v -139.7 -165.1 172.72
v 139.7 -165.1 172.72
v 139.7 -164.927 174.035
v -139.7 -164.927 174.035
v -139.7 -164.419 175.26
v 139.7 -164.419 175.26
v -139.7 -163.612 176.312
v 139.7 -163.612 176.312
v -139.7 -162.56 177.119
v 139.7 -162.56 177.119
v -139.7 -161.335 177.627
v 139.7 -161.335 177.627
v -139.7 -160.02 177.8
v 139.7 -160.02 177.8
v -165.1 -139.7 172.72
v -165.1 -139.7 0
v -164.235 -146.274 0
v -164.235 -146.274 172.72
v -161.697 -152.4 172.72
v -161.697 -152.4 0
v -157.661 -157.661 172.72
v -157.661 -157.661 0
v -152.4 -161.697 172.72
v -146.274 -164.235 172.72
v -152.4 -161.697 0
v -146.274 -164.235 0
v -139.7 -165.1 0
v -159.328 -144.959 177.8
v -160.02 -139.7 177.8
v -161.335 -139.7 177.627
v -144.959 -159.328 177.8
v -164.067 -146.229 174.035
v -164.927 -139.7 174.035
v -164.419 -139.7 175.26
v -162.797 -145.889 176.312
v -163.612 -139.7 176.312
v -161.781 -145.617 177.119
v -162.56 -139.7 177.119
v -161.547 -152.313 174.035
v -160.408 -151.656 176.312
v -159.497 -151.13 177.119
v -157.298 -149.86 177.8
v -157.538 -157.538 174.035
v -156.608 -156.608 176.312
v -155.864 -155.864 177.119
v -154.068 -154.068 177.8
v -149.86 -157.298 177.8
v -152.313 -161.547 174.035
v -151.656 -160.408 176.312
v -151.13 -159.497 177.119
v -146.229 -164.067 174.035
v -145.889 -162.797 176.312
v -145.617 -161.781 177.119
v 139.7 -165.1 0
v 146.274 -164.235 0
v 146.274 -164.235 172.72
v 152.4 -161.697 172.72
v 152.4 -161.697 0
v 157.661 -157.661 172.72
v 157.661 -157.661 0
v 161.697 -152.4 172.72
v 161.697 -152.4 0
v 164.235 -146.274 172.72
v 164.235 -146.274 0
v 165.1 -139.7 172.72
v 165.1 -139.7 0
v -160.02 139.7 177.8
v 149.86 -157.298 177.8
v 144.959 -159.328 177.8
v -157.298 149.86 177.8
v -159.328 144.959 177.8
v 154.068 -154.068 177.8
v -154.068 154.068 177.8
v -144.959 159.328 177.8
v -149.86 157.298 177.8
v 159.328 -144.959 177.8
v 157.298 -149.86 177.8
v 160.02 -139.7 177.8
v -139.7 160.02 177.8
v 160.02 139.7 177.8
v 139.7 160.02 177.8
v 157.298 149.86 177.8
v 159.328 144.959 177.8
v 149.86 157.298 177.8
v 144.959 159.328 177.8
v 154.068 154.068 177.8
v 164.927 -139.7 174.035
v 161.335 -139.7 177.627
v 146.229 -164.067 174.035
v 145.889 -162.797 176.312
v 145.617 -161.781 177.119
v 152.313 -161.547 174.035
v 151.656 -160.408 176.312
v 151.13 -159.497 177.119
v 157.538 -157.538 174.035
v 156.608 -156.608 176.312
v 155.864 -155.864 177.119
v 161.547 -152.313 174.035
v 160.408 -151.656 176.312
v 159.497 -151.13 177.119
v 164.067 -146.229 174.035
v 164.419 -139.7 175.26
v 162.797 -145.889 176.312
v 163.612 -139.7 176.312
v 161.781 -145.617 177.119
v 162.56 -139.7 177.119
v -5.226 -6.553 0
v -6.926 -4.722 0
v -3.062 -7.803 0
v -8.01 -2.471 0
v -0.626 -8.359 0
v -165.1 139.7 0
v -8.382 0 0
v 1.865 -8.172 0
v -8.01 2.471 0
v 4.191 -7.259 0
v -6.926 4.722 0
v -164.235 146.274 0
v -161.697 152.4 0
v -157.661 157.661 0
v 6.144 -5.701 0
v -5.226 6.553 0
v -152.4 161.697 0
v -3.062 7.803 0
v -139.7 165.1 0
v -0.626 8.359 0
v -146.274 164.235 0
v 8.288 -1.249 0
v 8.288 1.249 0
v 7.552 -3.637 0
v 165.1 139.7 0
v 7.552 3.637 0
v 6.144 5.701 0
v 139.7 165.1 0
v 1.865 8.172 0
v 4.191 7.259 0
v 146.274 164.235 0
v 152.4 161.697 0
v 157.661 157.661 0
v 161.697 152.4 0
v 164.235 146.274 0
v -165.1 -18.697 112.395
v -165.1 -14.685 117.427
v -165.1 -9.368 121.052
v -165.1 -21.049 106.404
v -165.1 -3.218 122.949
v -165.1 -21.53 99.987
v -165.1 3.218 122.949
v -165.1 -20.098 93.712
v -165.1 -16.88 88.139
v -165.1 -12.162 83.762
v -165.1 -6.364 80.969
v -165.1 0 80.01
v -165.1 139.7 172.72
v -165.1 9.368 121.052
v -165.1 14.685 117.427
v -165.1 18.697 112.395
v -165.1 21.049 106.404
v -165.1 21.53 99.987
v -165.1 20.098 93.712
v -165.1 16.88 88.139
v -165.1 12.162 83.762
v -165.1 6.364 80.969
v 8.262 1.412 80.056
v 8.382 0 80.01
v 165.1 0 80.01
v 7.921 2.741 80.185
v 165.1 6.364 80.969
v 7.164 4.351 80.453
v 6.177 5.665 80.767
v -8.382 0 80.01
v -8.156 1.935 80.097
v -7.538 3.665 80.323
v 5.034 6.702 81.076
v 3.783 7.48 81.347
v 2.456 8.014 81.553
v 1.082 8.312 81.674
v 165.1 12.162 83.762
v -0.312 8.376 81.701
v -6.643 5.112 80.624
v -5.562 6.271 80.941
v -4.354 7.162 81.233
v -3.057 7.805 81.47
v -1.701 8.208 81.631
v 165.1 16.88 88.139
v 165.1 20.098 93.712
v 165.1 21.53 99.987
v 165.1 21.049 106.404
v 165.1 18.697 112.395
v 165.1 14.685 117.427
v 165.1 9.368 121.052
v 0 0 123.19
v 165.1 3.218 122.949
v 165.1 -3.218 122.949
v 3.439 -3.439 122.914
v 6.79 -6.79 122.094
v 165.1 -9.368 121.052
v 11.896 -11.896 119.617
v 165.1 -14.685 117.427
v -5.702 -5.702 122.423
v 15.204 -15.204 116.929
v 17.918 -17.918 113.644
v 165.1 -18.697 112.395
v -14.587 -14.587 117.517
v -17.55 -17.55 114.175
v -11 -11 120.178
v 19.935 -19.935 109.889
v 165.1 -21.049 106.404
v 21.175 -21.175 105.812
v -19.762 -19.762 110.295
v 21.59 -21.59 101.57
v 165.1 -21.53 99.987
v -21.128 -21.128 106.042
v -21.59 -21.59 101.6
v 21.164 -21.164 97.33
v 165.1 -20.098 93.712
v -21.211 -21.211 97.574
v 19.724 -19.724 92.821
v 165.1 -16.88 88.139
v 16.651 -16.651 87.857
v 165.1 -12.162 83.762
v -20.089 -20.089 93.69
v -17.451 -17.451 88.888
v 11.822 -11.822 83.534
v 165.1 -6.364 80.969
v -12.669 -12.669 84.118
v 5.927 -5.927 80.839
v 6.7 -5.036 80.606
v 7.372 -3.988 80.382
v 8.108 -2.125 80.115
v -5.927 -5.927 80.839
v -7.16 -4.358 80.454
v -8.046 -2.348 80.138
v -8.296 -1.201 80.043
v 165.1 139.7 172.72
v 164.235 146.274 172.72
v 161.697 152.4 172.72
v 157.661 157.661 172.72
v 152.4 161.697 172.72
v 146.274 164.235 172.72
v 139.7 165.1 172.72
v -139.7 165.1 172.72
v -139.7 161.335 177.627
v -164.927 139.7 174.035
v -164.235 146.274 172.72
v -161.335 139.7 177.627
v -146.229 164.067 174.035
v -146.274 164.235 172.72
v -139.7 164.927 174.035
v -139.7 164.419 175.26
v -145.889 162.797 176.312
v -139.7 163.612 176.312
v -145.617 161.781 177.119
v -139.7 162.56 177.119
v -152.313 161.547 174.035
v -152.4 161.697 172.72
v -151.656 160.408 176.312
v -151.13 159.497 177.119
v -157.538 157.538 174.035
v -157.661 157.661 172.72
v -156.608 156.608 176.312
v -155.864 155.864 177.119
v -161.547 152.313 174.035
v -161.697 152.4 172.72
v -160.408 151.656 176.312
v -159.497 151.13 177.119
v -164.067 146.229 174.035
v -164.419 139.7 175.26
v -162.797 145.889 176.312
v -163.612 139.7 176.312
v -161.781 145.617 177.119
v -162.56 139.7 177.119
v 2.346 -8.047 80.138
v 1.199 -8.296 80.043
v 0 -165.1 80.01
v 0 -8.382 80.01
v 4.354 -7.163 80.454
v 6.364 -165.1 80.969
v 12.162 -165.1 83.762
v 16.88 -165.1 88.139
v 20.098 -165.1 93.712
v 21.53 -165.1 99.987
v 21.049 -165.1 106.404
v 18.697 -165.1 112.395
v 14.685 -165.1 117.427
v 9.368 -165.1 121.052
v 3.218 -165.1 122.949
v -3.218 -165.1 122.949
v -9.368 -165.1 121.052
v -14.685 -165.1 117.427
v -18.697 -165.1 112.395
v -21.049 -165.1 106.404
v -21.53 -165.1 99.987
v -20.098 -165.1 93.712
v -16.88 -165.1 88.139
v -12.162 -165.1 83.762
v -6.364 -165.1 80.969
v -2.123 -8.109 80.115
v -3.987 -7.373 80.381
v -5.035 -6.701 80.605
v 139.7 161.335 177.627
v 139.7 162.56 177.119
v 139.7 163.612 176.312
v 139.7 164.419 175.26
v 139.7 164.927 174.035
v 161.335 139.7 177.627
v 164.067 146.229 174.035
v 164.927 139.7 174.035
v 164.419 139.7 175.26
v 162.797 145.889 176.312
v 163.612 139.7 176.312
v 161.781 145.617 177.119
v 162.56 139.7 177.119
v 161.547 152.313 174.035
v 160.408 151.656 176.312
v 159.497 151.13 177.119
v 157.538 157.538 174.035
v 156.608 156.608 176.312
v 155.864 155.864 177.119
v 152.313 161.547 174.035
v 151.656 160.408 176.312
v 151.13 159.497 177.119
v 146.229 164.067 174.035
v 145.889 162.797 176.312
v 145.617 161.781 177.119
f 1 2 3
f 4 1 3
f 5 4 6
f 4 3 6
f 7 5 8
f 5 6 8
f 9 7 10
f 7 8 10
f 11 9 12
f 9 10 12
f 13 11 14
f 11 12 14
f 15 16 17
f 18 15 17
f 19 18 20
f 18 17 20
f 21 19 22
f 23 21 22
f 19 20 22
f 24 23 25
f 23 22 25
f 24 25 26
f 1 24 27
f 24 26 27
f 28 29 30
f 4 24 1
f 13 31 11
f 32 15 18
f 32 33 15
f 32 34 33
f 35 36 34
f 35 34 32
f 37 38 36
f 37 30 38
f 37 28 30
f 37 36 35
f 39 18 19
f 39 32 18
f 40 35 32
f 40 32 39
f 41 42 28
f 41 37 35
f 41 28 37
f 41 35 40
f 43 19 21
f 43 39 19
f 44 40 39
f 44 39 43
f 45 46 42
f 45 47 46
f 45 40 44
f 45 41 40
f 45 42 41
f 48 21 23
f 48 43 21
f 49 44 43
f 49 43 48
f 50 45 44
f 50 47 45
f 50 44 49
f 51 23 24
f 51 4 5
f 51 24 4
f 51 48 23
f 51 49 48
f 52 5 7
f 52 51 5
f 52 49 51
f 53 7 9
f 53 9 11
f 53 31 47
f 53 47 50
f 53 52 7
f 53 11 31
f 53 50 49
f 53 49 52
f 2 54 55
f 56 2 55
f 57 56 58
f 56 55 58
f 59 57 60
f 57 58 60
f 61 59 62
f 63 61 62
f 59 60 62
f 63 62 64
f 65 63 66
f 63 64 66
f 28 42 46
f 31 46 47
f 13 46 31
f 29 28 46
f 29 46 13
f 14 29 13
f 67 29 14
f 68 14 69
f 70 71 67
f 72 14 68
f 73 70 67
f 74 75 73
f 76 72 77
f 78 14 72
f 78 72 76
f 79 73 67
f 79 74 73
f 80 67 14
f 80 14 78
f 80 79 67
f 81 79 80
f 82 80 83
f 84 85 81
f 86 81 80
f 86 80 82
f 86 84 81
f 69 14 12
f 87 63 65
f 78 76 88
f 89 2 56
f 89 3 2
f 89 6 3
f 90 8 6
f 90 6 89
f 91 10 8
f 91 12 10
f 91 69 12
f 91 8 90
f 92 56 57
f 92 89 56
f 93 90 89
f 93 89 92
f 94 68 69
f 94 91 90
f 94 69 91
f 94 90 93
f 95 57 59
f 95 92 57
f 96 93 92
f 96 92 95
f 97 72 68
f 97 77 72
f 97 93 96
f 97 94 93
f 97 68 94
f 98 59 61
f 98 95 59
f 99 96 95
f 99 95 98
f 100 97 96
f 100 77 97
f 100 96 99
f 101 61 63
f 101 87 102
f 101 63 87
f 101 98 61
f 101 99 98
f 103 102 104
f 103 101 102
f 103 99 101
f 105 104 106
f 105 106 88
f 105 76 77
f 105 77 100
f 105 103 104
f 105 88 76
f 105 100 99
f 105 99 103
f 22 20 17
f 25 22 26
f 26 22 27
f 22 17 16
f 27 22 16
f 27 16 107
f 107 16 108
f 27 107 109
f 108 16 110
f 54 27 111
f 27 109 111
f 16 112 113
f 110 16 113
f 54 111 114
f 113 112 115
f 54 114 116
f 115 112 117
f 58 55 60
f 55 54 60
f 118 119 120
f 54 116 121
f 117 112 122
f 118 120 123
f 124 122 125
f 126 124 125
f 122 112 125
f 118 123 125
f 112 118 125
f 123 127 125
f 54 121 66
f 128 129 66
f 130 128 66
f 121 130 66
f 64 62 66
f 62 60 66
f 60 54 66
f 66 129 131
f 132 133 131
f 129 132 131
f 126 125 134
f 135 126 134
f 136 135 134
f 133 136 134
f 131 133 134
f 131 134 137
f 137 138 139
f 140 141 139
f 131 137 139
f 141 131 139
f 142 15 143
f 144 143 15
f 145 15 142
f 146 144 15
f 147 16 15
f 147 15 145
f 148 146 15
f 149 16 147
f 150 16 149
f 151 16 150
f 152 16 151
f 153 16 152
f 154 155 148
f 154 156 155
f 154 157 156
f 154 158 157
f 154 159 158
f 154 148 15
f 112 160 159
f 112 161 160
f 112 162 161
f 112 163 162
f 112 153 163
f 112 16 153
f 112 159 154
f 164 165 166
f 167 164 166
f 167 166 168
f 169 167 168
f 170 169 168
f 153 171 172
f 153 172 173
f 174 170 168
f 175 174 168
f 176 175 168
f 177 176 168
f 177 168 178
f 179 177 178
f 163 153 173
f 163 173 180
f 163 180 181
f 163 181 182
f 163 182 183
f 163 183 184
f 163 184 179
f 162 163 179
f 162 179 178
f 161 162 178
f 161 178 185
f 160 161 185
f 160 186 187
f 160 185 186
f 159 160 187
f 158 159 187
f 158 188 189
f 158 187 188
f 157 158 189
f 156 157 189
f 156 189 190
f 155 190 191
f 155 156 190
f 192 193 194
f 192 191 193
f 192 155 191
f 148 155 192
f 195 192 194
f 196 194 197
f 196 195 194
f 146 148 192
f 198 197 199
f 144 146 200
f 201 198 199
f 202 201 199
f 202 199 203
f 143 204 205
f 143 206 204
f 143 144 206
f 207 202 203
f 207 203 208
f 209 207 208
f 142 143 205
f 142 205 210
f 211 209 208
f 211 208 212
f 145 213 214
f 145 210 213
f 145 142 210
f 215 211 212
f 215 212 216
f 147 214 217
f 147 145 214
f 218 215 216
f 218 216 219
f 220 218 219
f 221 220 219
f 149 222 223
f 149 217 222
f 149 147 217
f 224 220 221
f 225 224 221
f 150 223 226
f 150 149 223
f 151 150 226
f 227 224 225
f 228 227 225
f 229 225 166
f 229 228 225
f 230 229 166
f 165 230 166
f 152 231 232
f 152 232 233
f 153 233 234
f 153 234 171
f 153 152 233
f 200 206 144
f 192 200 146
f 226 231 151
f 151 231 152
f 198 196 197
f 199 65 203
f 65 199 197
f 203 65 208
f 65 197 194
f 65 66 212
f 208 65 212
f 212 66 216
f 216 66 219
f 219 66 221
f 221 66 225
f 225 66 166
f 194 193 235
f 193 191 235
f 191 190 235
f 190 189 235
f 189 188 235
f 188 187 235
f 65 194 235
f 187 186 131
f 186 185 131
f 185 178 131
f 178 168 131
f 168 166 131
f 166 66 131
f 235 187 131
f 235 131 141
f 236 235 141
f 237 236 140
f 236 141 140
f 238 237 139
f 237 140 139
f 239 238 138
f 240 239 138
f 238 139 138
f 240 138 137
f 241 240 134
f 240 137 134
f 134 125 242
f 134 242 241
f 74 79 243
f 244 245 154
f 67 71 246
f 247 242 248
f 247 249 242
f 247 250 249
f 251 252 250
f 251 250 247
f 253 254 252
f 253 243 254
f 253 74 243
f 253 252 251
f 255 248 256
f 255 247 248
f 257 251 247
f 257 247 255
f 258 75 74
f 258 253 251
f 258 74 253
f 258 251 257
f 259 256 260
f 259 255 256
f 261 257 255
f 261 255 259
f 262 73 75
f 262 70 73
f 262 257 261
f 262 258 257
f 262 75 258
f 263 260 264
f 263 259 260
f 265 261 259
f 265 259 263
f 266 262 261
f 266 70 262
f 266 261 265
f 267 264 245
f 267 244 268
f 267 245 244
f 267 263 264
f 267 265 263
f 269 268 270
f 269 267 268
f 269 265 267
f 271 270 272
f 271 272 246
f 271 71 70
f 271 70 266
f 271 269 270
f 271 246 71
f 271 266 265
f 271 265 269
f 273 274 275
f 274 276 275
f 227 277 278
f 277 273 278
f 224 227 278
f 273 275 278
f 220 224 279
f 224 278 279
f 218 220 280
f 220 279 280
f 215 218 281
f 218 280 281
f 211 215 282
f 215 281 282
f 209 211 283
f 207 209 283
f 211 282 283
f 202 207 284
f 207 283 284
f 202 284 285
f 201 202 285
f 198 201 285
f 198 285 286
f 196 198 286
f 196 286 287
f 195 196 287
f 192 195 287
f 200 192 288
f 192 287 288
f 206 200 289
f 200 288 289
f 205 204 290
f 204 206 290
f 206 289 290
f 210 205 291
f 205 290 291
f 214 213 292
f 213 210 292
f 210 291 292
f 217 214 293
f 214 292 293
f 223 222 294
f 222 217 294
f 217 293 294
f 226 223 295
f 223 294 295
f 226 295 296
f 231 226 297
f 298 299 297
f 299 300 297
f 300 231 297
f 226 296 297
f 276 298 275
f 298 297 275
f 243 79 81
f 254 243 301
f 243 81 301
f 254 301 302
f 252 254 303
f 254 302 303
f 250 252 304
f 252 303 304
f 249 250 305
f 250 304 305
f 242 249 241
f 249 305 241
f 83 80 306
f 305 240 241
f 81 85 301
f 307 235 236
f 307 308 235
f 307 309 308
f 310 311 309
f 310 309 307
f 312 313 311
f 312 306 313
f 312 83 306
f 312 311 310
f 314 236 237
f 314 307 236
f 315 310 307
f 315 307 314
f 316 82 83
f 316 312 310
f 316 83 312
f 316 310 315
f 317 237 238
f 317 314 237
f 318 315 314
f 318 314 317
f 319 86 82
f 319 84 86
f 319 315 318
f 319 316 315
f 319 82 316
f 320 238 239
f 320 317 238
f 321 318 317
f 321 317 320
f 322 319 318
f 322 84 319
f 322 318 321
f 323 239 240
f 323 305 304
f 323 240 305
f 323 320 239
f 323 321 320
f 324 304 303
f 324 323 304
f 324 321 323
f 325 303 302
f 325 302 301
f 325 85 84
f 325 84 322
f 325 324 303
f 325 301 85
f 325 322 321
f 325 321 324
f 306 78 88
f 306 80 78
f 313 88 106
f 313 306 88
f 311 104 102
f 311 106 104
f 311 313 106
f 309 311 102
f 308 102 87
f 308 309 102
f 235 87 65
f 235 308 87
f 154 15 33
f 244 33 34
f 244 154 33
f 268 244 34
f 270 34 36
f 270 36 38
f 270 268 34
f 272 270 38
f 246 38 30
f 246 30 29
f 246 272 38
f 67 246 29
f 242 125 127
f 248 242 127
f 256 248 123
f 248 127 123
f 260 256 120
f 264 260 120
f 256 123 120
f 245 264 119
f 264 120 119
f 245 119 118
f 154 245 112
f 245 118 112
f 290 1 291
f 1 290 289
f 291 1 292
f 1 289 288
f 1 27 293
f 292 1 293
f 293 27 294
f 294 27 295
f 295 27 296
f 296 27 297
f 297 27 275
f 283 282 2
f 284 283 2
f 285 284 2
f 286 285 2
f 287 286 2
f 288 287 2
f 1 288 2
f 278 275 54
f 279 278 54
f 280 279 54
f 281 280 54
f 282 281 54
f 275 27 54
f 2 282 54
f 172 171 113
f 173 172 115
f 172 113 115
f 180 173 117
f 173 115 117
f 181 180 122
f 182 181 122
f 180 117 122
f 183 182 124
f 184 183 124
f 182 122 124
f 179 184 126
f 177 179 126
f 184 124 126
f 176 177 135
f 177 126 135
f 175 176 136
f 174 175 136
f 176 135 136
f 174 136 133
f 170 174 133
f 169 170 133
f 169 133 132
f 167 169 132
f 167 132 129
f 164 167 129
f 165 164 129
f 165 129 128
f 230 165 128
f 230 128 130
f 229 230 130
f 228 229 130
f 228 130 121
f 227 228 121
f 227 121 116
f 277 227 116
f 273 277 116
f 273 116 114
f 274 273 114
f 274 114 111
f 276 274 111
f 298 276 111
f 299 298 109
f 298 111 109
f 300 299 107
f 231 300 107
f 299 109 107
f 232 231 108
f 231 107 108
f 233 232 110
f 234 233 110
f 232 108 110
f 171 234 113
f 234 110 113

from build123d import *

# Parameters (mm, degrees)
SKETCH2_W               = 330.2
SKETCH2_H               = 330.2
BOSS_EXTRUDE1_DEPTH     = 177.8
CUT_EXTRUDE1_DEPTH      = 410.759551445
CUT_EXTRUDE1_DEPTH_BACK = 410.759551445
SKETCH3_R               = 21.59
SKETCH5_R               = 8.382
CUT_EXTRUDE3_DEPTH      = 101.6
SKETCH6_R               = 21.59
CUT_EXTRUDE4_DEPTH      = 165.1
FILLET1_R               = 5.08
FILLET2_R               = 25.4


with BuildPart() as part:
    # Sketch2 → Boss-Extrude1 (new body)
    with BuildSketch(Plane.XY):
        Rectangle(SKETCH2_W, SKETCH2_H)
    extrude(amount=BOSS_EXTRUDE1_DEPTH)

    # Sketch3 → Cut-Extrude1 (cut, two sides: drawn at the far end of the back side and taken through both)
    with BuildSketch(Plane(origin=(165.1, 0, 0), x_dir=(0, 0, -1), z_dir=(1, 0, 0)).offset(-CUT_EXTRUDE1_DEPTH_BACK)):
        with Locations((-101.6, 0)):
            Circle(SKETCH3_R)
    extrude(amount=CUT_EXTRUDE1_DEPTH + CUT_EXTRUDE1_DEPTH_BACK, mode=Mode.SUBTRACT)

    # Sketch5 → Cut-Extrude3 (cut)
    with BuildSketch(Plane(origin=(0, 0, 0), x_dir=(-1, 0, 0), z_dir=(0, 0, -1))):
        Circle(SKETCH5_R)
    extrude(amount=-CUT_EXTRUDE3_DEPTH, mode=Mode.SUBTRACT)

    # Sketch6 → Cut-Extrude4 (cut)
    with BuildSketch(Plane.XZ.offset(165.1)):
        with Locations(Location((0, 101.6, 0), (0, 0, 270))):
            Circle(SKETCH6_R)
    extrude(amount=-CUT_EXTRUDE4_DEPTH, mode=Mode.SUBTRACT)

    # Fillet1
    fillet1_edges = [part.edges().sort_by_distance(p)[0] for p in [
        (-165.1, 0, 177.8),
        (0, -165.1, 177.8),
        (165.1, 0, 177.8),
        (0, 165.1, 177.8),
    ]]
    fillet(fillet1_edges, radius=FILLET1_R)

    # Fillet2
    # the kernel refuses this fillet: 25.4 mm, written as the material it takes off along each edge
    with BuildSketch(Plane(origin=(-139.7, 139.7, 177.8), x_dir=(0, 1, 0), z_dir=(1, 0, 0))) as fillet2_piece_1:
        with BuildLine():
            CenterArc((20.32, -5.08), 5.08, 0, 90)
            Line((25.4, -5.08), (25.4, 0))
            Line((25.4, 0), (20.32, 0))
        make_face()
    revolve(axis=Axis((-139.7, 139.7, 177.8), (0, 0, 1)), revolution_arc=90, mode=Mode.SUBTRACT)
    with BuildSketch(Plane(origin=(139.7, 139.7, 177.8), x_dir=(1, 0, 0), z_dir=(0, -1, 0))) as fillet2_piece_2:
        with BuildLine():
            CenterArc((20.32, -5.08), 5.08, 0, 90)
            Line((25.4, -5.08), (25.4, 0))
            Line((25.4, 0), (20.32, 0))
        make_face()
    revolve(axis=Axis((139.7, 139.7, 177.8), (0, 0, 1)), revolution_arc=90, mode=Mode.SUBTRACT)
    with BuildSketch(Plane(origin=(-139.7, -139.7, 177.8), x_dir=(-1, 0, 0), z_dir=(0, 1, 0))) as fillet2_piece_3:
        with BuildLine():
            CenterArc((20.32, -5.08), 5.08, 0, 90)
            Line((25.4, -5.08), (25.4, 0))
            Line((25.4, 0), (20.32, 0))
        make_face()
    revolve(axis=Axis((-139.7, -139.7, 177.8), (0, 0, 1)), revolution_arc=90, mode=Mode.SUBTRACT)
    with BuildSketch(Plane(origin=(139.7, -139.7, 177.8), x_dir=(0, -1, 0), z_dir=(-1, 0, 0))) as fillet2_piece_4:
        with BuildLine():
            CenterArc((20.32, -5.08), 5.08, 0, 90)
            Line((25.4, -5.08), (25.4, 0))
            Line((25.4, 0), (20.32, 0))
        make_face()
    revolve(axis=Axis((139.7, -139.7, 177.8), (0, 0, 1)), revolution_arc=90, mode=Mode.SUBTRACT)
    with BuildSketch(Plane(origin=(165.1, -165.1, -63.5), x_dir=(-1, 0, 0), z_dir=(0, 0, 1)), Plane(origin=(165.1, 165.1, -63.5), x_dir=(0, -1, 0), z_dir=(0, 0, 1))) as fillet2_piece_5:
        with BuildLine():
            CenterArc((FILLET2_R, -FILLET2_R), FILLET2_R, 90, 90)
            Line((0, -FILLET2_R), (0, 0))
            Line((0, 0), (FILLET2_R, 0))
        make_face()
    extrude(amount=241.3, mode=Mode.SUBTRACT)
    with BuildSketch(Plane(origin=(-165.1, -165.1, -63.5), x_dir=(1, 0, 0), z_dir=(0, 0, 1)), Plane(origin=(-165.1, 165.1, -63.5), x_dir=(0, -1, 0), z_dir=(0, 0, 1))) as fillet2_piece_6:
        with BuildLine():
            CenterArc((FILLET2_R, FILLET2_R), FILLET2_R, 180, 90)
            Line((0, FILLET2_R), (0, 0))
            Line((0, 0), (FILLET2_R, 0))
        make_face()
    extrude(amount=241.3, mode=Mode.SUBTRACT)


solid = part.part
